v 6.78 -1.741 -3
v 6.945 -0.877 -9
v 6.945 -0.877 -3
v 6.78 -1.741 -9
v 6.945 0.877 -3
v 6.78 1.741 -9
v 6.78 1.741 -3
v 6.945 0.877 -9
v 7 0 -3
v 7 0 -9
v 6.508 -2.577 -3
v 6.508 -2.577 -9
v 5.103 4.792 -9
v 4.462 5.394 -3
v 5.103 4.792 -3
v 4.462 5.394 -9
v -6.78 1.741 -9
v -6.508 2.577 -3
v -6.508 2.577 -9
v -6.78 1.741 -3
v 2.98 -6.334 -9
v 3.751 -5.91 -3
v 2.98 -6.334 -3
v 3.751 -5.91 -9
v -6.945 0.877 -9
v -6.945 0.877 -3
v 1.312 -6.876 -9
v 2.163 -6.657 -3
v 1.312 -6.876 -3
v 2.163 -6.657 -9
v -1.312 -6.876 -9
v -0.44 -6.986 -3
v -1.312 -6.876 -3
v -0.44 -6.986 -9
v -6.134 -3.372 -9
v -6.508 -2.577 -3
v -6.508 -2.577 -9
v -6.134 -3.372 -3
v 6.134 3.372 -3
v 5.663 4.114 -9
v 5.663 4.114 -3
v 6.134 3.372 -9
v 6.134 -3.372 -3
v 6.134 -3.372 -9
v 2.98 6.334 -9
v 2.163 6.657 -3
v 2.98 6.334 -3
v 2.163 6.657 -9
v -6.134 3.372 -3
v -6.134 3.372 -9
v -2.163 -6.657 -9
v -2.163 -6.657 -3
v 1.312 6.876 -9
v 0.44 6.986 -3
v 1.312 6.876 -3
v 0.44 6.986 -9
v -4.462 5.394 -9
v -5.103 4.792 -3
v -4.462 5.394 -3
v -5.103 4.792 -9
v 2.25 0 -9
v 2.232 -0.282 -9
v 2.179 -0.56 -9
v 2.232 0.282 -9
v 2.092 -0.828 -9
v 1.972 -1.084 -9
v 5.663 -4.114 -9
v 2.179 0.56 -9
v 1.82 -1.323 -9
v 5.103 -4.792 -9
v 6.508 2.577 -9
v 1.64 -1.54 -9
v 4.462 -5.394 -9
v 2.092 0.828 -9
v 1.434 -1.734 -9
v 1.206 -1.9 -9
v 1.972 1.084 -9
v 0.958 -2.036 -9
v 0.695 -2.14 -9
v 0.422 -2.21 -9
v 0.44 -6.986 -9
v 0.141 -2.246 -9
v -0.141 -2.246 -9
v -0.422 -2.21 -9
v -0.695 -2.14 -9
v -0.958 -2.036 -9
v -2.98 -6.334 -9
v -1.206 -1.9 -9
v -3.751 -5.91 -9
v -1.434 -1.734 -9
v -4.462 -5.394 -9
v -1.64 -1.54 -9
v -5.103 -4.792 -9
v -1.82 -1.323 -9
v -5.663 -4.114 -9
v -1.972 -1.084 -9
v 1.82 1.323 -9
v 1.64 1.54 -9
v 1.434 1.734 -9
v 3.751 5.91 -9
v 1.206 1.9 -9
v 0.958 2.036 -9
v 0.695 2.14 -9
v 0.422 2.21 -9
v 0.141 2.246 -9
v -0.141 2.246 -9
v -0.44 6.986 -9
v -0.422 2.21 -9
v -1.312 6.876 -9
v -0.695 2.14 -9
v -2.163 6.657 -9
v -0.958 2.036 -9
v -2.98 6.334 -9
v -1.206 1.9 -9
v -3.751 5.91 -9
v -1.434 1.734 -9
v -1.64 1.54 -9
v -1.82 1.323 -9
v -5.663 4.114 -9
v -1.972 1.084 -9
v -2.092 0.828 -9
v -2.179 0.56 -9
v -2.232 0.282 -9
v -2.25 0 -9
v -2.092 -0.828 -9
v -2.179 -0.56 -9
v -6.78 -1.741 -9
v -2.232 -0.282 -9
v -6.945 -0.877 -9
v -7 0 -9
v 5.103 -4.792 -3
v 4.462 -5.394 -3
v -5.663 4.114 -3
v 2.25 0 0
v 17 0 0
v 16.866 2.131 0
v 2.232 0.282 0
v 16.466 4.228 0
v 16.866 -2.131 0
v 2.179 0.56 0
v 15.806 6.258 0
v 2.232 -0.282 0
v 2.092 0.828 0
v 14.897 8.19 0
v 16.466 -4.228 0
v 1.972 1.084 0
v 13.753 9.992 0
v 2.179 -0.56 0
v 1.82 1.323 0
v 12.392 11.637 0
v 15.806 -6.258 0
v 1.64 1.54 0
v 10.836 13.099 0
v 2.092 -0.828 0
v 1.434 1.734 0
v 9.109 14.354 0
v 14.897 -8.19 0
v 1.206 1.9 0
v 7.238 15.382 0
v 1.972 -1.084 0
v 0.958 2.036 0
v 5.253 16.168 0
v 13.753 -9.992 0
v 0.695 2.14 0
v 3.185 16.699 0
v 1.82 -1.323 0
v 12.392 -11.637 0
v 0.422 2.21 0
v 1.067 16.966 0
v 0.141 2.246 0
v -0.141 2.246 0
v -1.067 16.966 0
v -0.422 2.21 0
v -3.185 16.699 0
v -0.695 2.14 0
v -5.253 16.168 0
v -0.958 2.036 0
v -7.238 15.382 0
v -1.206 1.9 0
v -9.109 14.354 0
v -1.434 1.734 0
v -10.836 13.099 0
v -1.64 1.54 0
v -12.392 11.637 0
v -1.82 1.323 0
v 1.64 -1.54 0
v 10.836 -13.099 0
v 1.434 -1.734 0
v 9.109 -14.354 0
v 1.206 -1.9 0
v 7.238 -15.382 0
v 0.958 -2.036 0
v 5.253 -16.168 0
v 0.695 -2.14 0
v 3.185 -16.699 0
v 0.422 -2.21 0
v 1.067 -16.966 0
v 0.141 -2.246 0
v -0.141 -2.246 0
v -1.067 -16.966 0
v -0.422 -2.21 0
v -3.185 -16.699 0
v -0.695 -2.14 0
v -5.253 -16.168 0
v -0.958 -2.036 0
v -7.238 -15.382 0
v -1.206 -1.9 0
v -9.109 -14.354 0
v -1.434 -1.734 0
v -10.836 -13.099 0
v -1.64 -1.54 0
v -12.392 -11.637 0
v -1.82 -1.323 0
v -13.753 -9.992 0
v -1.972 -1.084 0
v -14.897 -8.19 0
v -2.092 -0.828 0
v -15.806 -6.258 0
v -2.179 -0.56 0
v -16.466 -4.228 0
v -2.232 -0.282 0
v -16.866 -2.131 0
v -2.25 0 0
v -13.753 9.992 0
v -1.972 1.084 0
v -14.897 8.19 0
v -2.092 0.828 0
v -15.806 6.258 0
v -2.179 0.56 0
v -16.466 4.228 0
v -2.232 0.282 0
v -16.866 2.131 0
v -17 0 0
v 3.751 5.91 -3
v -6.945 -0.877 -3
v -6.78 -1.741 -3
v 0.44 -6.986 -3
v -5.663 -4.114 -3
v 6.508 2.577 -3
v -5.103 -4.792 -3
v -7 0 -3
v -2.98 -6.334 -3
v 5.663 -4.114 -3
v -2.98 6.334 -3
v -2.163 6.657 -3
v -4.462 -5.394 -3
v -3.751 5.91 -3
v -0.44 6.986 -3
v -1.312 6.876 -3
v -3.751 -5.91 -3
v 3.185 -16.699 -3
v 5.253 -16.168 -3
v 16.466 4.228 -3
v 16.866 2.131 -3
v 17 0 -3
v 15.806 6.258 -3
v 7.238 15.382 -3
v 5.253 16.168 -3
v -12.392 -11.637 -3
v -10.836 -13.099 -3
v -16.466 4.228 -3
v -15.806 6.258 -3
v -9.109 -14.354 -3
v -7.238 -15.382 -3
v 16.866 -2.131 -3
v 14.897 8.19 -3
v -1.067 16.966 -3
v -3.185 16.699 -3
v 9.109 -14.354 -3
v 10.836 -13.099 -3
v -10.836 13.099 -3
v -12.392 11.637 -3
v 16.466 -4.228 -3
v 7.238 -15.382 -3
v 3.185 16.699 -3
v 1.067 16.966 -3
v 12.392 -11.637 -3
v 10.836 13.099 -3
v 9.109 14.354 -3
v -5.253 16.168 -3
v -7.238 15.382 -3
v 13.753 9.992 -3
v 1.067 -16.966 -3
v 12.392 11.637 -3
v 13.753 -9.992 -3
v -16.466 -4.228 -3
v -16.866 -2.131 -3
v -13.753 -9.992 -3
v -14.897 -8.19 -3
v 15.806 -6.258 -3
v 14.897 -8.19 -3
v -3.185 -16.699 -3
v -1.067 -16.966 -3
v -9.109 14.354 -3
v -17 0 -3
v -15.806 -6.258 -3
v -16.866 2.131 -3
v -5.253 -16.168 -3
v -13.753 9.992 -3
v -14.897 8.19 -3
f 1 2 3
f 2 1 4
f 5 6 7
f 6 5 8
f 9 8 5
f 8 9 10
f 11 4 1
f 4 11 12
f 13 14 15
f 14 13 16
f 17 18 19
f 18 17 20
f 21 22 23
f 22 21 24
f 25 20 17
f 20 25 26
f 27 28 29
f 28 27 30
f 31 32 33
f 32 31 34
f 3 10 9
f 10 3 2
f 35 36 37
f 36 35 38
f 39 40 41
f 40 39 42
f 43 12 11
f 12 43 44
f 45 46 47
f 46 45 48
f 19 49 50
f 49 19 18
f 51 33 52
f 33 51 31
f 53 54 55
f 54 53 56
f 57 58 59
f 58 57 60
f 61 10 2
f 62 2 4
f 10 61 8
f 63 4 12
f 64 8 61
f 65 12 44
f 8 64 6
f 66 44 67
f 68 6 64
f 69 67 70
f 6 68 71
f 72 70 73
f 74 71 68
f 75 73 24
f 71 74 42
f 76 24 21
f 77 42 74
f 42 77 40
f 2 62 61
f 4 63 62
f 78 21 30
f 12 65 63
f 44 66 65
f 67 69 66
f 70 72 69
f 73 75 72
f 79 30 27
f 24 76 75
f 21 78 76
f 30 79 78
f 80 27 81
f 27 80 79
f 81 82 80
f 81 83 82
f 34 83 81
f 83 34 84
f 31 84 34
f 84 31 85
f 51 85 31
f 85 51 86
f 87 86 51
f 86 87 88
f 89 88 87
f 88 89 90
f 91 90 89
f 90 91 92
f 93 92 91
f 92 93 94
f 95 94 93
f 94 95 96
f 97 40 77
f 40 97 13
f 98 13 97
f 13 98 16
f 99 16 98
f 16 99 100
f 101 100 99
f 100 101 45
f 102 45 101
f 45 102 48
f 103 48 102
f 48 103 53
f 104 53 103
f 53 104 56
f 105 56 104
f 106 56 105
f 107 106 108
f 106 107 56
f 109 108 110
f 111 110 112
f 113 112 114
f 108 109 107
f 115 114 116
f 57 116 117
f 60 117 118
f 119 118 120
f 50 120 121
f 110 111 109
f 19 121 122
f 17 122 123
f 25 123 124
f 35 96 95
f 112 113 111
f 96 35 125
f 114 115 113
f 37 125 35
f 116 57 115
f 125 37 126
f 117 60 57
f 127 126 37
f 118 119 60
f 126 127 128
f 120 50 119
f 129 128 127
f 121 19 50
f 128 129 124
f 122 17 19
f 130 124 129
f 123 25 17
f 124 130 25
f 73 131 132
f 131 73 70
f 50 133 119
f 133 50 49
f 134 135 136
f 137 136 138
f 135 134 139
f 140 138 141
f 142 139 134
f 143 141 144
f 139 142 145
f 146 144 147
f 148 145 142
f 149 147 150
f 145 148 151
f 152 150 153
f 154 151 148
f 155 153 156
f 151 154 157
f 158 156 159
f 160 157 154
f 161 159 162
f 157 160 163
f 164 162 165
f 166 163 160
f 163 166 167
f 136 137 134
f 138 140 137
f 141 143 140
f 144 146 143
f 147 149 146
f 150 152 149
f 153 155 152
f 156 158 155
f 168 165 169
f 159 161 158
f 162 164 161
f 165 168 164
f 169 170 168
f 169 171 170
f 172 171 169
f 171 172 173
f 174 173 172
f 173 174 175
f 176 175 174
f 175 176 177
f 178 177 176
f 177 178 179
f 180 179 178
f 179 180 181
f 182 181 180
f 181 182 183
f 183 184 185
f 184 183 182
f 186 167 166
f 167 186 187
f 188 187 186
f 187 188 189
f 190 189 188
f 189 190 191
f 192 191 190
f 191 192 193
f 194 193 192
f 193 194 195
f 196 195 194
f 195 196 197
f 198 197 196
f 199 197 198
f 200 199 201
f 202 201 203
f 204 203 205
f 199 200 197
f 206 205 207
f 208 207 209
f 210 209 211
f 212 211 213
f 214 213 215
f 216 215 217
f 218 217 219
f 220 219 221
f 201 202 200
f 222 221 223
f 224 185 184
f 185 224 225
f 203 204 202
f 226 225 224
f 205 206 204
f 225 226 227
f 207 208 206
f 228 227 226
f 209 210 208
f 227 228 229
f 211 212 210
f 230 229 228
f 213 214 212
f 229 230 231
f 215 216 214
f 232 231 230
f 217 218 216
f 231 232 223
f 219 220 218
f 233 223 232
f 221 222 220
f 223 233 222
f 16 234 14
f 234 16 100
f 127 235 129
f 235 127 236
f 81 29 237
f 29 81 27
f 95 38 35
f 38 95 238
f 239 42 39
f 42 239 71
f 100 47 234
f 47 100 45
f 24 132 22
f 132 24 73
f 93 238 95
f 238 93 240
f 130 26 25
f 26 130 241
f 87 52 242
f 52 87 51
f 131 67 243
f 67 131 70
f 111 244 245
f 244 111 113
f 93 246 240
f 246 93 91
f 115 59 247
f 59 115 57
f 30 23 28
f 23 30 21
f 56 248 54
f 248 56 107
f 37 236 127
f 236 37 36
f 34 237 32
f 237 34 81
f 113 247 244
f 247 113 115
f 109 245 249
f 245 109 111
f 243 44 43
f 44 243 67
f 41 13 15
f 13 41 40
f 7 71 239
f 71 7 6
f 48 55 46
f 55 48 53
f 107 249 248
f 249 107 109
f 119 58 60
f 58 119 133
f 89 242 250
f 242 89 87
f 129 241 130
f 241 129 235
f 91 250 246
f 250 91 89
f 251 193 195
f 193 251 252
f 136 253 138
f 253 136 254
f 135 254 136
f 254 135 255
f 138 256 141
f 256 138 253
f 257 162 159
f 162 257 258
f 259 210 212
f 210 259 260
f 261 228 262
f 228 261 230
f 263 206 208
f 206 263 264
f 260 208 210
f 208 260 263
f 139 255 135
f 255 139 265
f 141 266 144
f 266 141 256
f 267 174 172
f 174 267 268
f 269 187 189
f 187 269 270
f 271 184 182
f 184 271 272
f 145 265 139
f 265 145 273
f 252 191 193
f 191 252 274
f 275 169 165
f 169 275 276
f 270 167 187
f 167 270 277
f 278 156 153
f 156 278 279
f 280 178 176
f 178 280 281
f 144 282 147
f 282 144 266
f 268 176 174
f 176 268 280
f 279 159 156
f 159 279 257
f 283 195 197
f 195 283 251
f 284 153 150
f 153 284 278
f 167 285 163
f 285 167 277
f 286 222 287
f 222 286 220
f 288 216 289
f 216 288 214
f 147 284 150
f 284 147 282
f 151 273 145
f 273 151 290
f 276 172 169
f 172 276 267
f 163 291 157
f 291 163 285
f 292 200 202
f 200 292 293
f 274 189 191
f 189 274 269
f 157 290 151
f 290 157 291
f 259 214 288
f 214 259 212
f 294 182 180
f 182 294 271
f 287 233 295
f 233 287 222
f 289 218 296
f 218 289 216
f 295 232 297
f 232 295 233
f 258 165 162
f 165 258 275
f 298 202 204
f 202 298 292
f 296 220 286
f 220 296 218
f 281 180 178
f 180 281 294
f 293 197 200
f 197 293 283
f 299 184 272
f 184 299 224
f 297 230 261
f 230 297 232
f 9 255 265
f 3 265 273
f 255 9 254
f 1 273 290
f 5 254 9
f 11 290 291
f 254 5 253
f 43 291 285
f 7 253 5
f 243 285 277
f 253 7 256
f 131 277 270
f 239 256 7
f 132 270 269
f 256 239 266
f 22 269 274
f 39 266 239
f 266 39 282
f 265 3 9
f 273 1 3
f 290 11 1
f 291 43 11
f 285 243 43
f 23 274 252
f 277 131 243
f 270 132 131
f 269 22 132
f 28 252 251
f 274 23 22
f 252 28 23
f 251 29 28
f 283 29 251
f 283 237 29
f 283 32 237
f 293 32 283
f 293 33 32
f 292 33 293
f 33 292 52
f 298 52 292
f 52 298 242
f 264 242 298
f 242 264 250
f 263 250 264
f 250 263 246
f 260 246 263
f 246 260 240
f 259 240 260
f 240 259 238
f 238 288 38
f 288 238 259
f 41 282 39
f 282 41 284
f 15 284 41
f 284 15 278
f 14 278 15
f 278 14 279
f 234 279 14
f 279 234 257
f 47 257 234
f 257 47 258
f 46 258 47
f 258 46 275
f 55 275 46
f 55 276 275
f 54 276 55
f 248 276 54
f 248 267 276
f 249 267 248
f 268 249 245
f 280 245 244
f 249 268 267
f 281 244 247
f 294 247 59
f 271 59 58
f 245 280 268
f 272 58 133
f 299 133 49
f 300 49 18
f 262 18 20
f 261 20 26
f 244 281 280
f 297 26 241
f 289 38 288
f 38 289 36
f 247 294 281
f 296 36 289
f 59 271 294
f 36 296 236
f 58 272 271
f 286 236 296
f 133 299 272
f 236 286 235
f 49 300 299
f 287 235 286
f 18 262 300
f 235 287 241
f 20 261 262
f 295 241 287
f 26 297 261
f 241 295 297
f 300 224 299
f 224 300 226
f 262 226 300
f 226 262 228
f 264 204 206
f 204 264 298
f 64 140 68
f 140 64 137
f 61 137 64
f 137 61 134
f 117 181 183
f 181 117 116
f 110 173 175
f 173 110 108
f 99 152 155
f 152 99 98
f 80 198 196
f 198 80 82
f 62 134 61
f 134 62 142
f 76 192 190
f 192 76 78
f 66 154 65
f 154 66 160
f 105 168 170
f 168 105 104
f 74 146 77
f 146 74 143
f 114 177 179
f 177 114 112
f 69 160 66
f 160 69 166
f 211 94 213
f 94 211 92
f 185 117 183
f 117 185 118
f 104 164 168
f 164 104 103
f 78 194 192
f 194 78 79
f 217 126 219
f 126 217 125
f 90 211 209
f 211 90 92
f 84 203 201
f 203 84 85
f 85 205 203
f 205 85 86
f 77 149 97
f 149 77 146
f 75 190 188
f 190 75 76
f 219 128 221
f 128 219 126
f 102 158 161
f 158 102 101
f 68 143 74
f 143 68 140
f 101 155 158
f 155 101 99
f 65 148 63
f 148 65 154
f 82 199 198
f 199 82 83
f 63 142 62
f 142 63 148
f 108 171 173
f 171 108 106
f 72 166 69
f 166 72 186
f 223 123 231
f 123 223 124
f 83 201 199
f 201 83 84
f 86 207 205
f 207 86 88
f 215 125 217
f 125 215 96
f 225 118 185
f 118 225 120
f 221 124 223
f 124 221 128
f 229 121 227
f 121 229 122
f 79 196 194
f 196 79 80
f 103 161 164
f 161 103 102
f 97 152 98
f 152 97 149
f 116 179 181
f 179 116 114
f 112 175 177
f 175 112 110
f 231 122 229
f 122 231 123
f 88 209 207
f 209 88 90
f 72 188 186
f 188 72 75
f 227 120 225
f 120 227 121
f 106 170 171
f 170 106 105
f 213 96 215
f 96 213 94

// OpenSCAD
$fn = 50;


difference() {
	union() {
		translate(v = [0, 0, -9.0000000000]) {
			cylinder(h = 9, r = 7.0000000000);
		}
		translate(v = [0, 0, -3.0000000000]) {
			cylinder(h = 3, r = 17.0000000000);
		}
	}
	union() {
		#translate(v = [0, 0, -9]) {
			cylinder(h = 9, r = 2.2500000000);
		}
	}
}
